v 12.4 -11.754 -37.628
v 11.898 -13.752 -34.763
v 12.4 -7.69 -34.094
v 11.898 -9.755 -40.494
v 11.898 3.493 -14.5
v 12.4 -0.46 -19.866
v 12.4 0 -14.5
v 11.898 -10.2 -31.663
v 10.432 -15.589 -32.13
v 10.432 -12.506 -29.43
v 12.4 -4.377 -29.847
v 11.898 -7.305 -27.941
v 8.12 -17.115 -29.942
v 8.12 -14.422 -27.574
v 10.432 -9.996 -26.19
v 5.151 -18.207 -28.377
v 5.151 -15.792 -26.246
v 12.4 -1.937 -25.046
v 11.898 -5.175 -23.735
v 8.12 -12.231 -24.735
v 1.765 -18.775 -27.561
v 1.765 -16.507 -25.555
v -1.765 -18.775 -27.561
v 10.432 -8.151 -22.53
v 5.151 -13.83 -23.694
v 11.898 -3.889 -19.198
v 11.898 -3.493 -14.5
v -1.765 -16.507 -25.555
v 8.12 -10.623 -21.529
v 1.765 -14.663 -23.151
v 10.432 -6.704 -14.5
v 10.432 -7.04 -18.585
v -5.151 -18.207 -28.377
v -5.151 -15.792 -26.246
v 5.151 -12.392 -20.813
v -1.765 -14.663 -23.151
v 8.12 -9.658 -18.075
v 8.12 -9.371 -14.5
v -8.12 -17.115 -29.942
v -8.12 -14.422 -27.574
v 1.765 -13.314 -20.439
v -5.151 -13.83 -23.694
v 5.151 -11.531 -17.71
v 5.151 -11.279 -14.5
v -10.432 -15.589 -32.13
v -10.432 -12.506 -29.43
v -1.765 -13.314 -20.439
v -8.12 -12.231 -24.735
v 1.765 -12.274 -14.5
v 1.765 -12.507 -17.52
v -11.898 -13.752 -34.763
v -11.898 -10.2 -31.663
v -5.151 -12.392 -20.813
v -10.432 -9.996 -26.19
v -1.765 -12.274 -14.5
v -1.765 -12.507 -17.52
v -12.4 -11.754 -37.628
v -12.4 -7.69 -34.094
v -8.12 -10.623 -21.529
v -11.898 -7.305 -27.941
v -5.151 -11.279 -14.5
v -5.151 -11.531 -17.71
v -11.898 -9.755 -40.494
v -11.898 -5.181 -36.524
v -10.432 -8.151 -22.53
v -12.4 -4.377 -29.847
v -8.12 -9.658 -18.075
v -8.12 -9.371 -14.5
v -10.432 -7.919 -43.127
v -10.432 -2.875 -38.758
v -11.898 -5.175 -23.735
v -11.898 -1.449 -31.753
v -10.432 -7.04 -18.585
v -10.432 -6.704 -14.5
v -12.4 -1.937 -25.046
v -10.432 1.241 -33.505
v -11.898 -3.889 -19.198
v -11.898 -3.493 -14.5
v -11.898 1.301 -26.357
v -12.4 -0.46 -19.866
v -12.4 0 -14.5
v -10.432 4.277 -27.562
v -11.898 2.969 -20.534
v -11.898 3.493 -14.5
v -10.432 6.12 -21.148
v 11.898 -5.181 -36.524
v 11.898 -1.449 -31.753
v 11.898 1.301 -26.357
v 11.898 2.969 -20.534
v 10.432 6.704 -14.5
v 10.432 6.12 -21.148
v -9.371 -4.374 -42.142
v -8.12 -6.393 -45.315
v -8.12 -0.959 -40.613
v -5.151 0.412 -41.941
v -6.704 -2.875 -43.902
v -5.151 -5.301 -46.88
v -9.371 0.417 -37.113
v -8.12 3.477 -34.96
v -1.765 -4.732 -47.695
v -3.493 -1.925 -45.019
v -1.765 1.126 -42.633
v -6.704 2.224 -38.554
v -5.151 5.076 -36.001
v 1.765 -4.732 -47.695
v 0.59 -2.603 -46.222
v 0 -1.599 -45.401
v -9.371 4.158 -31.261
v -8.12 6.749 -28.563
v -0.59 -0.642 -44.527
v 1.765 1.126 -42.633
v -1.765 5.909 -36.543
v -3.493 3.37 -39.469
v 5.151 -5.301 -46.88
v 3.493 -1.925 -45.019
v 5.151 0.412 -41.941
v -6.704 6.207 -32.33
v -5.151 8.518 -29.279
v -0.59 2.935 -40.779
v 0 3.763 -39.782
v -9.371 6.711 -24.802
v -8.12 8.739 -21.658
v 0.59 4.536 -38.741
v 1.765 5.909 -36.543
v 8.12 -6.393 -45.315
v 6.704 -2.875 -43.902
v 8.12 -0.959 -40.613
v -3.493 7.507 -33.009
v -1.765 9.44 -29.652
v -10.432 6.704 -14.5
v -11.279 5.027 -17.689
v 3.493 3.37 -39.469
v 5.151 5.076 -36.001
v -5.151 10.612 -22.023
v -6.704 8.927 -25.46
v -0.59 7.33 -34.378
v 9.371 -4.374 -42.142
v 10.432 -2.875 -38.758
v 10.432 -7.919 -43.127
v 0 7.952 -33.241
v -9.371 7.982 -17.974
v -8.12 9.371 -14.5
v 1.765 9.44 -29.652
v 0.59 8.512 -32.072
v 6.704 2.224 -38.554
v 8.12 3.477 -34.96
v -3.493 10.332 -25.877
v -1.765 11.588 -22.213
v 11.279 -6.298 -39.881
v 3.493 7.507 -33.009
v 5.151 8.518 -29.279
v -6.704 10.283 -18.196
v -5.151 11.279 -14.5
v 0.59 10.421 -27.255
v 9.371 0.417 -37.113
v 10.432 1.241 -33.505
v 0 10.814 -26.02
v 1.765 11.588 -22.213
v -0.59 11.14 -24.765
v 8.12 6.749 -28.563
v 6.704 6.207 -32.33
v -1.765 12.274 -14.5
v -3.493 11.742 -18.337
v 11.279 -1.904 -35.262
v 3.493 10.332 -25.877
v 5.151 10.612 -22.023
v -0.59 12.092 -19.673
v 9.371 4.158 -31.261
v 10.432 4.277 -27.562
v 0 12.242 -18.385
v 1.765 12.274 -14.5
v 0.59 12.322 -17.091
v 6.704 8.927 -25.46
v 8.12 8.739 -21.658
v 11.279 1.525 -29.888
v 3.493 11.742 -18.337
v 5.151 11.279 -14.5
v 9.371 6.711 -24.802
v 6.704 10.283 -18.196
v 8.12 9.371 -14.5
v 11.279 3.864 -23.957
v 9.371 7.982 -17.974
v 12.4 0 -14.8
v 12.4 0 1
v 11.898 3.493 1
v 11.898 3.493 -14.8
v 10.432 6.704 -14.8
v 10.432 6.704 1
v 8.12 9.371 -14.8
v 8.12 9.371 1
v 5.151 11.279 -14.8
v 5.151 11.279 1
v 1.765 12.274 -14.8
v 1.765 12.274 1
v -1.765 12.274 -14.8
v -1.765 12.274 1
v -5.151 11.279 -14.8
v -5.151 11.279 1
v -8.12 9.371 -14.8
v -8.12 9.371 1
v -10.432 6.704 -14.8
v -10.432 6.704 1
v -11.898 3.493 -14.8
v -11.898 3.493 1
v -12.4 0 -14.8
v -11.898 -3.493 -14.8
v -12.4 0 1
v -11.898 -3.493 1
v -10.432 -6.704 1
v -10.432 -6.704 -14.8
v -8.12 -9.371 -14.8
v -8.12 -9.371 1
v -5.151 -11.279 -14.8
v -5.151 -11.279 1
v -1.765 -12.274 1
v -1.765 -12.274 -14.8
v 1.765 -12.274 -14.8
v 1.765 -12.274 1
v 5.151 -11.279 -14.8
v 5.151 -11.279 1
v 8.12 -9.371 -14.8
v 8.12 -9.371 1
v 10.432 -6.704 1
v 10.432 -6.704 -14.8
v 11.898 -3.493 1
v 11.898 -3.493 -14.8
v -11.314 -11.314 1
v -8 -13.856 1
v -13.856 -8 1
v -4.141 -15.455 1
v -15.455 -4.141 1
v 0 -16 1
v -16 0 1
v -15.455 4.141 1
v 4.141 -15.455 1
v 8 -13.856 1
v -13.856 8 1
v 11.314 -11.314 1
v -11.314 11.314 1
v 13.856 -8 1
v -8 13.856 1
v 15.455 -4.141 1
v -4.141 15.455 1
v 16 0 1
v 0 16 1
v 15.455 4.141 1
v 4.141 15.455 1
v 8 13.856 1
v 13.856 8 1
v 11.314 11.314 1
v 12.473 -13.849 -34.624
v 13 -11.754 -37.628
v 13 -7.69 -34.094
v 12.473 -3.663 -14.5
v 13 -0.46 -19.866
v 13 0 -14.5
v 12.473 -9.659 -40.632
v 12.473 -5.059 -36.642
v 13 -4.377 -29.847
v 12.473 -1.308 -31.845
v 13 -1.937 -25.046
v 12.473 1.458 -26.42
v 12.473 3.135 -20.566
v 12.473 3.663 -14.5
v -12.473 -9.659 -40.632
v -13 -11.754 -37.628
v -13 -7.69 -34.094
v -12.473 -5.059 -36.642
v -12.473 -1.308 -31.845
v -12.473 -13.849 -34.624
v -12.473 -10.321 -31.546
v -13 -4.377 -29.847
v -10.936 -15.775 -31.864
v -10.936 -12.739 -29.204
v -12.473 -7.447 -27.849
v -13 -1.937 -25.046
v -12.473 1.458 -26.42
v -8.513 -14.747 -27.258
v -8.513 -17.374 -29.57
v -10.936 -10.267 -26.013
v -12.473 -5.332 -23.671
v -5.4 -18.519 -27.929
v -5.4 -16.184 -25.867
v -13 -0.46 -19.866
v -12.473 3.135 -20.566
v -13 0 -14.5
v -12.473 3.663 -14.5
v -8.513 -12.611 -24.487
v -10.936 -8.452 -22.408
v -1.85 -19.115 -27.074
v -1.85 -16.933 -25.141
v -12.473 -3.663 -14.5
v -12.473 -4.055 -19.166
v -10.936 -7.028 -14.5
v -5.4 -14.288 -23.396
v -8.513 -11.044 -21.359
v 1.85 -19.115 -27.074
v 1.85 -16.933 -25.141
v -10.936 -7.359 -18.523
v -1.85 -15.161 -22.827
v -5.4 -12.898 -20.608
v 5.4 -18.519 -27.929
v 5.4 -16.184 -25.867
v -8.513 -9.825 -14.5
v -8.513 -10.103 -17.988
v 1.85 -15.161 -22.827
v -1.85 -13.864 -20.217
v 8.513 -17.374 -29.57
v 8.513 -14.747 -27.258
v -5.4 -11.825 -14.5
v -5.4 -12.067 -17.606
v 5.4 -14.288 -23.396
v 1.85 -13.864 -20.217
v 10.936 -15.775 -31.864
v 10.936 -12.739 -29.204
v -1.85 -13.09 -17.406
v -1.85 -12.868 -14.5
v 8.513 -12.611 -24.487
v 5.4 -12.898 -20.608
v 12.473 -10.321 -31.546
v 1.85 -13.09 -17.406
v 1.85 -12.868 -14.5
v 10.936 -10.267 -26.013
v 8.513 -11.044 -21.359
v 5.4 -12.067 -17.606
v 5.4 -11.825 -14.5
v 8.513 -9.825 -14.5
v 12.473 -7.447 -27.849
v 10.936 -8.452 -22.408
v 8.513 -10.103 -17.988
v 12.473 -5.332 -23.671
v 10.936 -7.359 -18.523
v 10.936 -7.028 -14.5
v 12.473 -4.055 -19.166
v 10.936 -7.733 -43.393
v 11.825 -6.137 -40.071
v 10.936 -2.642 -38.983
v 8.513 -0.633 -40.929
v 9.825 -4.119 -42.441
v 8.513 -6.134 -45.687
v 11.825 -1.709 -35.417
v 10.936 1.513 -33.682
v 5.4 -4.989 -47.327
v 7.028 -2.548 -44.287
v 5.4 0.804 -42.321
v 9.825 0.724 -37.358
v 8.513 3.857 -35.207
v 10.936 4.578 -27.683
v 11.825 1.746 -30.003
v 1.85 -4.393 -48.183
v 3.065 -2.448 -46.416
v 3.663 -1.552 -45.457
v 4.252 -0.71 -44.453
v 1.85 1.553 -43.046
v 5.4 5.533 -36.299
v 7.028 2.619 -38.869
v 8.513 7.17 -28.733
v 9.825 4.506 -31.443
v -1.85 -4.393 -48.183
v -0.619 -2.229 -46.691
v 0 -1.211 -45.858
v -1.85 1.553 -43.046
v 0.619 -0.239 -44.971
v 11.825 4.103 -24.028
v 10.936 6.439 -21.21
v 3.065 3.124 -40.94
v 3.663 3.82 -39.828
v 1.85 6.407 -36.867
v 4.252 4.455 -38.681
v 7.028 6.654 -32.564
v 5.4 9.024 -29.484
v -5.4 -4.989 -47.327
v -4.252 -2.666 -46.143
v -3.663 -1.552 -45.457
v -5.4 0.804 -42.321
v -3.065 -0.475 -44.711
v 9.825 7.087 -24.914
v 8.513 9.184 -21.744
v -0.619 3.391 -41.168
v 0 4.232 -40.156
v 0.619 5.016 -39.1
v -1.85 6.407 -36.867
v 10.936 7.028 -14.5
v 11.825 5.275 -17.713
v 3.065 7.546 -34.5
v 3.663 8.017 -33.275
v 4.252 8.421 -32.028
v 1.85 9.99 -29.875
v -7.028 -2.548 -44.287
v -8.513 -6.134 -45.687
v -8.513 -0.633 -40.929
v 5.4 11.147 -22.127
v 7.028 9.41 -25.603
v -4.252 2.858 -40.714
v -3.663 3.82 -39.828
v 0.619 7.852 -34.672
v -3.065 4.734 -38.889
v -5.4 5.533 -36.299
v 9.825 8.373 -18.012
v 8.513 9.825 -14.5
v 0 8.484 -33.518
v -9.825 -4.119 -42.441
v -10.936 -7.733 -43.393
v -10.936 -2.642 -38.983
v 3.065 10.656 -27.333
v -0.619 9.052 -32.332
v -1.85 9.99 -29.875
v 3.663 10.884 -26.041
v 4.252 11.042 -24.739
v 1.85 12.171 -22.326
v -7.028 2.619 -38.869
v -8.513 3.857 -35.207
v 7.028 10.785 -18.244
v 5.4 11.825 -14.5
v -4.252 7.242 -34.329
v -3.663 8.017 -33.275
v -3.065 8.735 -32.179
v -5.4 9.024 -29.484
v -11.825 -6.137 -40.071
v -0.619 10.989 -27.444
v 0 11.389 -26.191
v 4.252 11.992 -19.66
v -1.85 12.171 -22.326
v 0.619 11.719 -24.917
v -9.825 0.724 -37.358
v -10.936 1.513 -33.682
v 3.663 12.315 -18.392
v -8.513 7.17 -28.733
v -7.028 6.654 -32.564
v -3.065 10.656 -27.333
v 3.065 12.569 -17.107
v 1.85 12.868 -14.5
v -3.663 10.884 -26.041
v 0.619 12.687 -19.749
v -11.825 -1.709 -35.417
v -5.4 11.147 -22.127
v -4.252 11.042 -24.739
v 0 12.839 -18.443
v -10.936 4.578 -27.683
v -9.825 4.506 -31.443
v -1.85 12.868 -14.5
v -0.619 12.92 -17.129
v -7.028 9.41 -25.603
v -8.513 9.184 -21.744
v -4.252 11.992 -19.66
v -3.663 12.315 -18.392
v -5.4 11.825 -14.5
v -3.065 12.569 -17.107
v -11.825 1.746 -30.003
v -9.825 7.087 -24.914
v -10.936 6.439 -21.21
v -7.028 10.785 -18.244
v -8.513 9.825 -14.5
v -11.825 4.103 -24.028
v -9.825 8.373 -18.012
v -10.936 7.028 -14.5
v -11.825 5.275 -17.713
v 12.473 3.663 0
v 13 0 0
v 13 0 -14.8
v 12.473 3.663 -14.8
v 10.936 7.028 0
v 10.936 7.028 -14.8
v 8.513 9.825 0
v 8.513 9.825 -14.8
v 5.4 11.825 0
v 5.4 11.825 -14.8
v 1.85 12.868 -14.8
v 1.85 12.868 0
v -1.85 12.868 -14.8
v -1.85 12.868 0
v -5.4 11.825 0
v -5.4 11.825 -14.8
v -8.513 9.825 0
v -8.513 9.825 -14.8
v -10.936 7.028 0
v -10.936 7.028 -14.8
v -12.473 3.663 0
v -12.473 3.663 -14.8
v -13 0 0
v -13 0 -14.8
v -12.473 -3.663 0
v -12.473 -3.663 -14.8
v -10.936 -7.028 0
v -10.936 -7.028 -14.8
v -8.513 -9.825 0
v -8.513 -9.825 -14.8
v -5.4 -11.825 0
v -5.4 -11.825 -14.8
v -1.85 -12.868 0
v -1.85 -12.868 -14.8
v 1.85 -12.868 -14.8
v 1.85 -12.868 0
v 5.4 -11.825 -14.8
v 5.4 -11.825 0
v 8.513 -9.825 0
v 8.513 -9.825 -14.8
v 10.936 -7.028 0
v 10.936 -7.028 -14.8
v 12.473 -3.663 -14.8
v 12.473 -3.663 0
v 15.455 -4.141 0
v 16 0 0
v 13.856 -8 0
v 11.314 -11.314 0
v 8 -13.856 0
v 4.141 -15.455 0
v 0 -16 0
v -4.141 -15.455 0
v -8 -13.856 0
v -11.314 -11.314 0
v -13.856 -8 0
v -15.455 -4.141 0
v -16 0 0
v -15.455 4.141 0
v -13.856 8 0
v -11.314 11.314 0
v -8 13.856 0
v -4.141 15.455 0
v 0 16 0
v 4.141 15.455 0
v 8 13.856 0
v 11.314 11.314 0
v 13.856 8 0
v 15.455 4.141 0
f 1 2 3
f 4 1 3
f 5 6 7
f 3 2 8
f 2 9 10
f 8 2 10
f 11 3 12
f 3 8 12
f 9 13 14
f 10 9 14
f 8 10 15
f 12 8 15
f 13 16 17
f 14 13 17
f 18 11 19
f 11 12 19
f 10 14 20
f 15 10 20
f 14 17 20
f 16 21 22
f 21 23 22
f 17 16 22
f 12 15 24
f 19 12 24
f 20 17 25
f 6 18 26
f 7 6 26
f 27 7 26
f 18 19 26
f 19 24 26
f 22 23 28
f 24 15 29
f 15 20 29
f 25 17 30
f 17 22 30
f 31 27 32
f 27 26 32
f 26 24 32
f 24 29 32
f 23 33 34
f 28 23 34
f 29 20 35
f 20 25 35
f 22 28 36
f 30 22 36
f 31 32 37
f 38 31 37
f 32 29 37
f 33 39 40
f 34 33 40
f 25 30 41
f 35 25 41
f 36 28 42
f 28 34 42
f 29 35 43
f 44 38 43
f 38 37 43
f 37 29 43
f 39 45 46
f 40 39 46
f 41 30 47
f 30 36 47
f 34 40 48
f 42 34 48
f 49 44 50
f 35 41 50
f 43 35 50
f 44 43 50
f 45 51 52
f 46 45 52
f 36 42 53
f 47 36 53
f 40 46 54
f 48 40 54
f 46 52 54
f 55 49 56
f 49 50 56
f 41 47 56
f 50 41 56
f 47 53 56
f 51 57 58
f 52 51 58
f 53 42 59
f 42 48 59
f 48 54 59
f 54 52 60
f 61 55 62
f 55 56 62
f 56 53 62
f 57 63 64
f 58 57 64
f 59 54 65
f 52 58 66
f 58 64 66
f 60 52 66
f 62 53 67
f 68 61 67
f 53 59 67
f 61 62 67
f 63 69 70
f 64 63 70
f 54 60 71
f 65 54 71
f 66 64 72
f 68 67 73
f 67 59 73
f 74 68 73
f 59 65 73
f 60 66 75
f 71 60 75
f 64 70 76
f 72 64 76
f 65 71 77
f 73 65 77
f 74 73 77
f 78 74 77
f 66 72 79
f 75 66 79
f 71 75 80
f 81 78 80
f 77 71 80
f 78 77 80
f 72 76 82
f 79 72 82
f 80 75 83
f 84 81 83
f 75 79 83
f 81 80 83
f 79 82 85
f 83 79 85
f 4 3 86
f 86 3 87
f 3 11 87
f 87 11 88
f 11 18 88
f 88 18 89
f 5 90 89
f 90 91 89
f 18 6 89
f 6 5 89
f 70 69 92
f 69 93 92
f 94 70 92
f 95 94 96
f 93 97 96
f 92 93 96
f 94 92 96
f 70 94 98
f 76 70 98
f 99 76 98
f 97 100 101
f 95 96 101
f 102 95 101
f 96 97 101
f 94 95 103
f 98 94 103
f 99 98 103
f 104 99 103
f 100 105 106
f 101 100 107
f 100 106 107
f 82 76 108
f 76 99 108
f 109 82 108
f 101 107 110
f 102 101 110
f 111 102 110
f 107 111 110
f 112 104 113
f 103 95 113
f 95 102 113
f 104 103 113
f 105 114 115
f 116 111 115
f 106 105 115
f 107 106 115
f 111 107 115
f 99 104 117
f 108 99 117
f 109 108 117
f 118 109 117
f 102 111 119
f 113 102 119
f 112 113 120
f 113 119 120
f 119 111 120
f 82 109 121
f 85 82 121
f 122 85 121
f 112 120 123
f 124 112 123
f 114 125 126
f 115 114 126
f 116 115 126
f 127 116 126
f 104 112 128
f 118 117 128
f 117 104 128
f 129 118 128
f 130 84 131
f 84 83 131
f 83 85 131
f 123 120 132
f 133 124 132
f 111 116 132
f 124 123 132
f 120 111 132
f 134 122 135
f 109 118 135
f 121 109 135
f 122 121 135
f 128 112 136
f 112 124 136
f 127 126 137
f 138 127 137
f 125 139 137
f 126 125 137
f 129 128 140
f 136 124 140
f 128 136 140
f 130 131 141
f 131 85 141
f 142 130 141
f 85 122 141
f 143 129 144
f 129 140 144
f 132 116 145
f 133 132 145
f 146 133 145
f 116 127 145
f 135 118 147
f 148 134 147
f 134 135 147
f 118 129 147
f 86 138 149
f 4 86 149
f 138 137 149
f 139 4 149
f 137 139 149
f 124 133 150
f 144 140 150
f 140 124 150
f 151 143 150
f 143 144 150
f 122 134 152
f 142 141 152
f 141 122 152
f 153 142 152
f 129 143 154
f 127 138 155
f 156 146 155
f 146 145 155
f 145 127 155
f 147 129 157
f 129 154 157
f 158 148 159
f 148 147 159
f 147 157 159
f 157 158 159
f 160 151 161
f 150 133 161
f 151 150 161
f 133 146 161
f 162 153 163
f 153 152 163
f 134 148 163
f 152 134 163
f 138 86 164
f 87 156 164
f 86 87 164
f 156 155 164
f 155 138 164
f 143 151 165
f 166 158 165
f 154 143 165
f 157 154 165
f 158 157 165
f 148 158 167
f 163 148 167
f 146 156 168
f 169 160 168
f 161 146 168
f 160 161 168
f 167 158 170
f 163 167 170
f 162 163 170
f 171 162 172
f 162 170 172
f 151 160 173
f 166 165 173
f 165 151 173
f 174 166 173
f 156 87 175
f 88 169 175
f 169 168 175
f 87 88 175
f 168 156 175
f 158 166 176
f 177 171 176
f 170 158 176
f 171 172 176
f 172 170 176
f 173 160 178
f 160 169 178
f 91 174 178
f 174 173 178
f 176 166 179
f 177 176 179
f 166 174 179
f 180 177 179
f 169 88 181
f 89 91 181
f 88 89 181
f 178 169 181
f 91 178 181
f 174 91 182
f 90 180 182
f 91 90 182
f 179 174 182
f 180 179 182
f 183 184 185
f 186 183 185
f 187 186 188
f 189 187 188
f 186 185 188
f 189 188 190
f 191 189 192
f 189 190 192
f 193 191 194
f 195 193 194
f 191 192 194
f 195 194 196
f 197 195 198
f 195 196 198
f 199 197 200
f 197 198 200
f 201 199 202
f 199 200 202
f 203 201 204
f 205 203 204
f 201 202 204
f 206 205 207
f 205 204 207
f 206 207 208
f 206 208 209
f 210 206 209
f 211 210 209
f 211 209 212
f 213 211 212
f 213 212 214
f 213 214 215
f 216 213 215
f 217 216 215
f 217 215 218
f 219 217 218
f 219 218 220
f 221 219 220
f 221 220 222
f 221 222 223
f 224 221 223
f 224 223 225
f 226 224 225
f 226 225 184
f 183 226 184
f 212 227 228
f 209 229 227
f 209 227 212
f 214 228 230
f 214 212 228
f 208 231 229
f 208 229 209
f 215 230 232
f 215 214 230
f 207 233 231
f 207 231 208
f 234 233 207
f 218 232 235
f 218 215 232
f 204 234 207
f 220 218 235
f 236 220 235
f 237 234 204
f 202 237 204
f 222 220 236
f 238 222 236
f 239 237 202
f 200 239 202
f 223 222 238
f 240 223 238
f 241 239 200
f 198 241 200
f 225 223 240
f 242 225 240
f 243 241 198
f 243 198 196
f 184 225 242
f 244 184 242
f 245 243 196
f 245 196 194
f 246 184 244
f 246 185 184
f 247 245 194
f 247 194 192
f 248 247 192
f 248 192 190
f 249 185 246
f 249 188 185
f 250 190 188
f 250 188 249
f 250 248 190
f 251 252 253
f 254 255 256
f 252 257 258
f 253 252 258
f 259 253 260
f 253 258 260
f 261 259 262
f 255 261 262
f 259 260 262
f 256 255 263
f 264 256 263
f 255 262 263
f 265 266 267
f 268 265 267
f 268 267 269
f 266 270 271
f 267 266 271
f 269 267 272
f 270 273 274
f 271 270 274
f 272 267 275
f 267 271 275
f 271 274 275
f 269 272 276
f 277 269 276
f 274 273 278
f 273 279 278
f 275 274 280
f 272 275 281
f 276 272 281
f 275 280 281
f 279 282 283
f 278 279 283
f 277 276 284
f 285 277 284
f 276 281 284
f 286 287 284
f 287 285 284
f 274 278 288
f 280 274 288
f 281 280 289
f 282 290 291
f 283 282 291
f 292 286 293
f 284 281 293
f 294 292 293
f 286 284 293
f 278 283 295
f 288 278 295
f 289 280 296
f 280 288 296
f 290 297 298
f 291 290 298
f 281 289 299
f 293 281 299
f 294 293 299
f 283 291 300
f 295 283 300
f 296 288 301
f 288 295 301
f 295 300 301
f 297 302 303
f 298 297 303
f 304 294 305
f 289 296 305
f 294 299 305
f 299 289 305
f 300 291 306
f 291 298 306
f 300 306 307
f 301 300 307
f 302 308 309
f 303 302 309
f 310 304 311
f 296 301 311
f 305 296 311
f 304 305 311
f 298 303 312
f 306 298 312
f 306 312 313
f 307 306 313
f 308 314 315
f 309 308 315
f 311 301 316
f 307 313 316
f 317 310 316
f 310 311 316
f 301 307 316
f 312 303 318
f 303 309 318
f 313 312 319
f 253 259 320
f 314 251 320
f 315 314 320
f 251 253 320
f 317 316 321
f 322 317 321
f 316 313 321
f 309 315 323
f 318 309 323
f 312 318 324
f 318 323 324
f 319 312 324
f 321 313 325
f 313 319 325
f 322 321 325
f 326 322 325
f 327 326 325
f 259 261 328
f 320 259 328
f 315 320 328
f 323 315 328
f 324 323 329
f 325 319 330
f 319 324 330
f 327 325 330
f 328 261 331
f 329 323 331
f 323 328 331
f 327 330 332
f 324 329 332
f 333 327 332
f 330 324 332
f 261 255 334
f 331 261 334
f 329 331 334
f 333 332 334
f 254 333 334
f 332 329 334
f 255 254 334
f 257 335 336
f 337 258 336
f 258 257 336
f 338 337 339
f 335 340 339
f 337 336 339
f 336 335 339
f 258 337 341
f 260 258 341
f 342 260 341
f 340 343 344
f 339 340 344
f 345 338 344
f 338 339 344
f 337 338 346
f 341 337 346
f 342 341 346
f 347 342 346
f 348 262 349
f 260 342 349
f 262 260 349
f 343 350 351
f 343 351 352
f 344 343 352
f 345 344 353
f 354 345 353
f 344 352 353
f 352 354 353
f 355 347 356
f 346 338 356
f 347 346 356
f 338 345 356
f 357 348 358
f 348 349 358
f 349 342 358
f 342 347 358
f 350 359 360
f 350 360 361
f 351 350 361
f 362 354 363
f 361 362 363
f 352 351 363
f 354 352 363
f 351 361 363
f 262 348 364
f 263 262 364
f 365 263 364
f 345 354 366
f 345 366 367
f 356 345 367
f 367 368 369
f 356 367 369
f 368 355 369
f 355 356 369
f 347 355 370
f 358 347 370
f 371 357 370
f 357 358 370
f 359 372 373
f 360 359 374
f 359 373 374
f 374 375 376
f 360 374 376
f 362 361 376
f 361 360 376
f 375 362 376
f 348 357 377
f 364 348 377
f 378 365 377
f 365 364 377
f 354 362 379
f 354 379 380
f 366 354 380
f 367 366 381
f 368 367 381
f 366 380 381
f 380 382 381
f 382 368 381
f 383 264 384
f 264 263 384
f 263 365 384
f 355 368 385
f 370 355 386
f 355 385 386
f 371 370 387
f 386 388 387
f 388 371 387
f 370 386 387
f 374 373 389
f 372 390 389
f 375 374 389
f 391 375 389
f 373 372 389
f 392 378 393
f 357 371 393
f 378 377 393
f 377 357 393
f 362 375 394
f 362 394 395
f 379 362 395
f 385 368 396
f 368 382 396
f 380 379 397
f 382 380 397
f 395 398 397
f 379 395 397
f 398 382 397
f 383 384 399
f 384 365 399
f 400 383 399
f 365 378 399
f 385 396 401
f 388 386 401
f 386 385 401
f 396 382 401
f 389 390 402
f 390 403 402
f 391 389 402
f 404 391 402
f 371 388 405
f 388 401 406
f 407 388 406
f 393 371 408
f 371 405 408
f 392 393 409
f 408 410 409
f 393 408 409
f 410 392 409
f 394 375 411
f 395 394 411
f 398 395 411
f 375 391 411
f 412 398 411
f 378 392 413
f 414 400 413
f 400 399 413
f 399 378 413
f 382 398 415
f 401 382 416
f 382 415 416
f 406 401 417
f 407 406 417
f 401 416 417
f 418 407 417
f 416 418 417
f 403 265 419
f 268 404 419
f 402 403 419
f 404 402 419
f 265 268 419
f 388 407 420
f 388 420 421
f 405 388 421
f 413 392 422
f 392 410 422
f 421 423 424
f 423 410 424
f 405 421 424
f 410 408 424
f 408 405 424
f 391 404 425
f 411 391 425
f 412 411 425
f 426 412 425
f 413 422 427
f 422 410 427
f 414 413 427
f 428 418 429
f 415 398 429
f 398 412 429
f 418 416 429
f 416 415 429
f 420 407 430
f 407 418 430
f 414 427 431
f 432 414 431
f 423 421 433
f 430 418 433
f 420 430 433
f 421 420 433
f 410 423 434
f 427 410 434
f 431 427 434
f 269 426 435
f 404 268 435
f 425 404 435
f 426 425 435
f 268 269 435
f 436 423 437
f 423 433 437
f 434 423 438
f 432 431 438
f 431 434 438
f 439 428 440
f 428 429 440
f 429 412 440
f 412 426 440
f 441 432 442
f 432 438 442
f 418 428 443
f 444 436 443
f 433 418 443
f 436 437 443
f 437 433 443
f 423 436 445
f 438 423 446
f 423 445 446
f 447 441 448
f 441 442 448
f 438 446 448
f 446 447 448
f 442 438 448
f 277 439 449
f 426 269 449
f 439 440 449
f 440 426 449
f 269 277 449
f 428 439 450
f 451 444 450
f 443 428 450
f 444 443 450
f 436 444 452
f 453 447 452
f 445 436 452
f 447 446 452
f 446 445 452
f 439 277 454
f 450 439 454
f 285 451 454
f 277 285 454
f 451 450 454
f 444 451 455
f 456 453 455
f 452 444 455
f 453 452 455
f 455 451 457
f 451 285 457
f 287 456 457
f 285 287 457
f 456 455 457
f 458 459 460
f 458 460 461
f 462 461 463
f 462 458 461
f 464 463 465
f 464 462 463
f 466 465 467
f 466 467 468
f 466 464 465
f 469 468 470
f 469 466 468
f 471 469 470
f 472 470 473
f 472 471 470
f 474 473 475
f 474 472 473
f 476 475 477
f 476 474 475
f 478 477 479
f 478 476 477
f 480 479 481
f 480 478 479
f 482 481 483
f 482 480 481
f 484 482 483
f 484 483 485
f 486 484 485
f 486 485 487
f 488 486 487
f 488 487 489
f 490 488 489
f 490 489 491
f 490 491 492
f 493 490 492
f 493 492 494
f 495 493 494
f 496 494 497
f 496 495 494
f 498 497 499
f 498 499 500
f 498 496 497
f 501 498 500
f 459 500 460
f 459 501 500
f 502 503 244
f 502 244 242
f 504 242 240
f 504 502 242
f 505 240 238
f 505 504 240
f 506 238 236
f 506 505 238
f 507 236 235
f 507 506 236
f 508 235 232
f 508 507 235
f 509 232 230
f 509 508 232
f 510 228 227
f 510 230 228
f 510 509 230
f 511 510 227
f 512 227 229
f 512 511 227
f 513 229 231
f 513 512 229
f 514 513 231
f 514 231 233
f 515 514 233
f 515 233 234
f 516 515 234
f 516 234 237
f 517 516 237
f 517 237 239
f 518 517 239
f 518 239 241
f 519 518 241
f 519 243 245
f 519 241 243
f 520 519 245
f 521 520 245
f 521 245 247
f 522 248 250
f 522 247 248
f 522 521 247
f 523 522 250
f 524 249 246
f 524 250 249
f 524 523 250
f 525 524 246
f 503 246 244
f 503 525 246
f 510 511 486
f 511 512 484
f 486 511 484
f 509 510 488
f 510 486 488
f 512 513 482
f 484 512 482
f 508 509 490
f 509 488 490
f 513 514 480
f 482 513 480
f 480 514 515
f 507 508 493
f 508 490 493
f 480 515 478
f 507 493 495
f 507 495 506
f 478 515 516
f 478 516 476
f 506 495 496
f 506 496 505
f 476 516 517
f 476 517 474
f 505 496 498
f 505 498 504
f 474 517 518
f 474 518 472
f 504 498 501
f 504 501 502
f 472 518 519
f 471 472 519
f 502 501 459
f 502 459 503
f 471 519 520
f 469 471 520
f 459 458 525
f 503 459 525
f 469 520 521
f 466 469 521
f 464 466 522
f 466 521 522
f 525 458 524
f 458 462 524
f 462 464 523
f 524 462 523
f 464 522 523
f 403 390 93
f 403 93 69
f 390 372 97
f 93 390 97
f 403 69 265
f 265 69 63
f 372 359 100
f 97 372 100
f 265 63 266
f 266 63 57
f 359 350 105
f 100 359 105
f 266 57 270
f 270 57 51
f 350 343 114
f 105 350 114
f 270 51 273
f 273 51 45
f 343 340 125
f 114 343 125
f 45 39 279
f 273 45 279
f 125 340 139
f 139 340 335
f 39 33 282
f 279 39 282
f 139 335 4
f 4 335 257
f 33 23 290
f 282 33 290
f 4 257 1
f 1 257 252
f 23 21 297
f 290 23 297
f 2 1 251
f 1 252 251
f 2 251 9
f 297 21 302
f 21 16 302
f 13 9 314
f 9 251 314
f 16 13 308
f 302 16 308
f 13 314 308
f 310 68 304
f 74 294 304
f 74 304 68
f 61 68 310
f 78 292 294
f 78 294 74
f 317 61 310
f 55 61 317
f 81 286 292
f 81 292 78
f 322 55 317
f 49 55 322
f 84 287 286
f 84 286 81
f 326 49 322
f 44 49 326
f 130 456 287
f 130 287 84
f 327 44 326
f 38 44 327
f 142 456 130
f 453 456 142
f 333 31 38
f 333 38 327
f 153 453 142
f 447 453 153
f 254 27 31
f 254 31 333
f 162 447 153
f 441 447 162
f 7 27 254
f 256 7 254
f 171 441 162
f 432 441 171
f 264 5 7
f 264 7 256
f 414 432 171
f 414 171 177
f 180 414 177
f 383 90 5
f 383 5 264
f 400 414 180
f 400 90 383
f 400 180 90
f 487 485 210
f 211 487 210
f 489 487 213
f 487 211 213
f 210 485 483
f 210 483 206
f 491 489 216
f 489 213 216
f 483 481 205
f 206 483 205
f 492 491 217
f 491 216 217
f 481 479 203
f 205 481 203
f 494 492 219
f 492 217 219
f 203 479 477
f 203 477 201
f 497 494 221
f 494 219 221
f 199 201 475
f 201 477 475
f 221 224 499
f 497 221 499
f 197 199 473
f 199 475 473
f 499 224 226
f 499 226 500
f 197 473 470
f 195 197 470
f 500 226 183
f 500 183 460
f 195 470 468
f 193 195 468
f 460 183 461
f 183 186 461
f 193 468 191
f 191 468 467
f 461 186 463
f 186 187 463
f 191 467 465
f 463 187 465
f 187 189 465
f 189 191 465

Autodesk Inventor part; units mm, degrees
ref_plane "YZ Plane" through (0, 0, 0) normal (1, 0, 0) x (0, 1, 0)
ref_plane "XZ Plane" through (0, 0, 0) normal (0, 1, 0) x (-1, 0, 0)
ref_plane "XY Plane" through (0, 0, 0) normal (0, 0, 1) x (1, 0, 0)
sketch "Esquisse2" plane through (0, 0, 0) normal (0, 0, 1) x (1, 0, 0)
  circle A0 centre (0, 0) radius 16
  circle A1 centre (0, 0) radius 13
  dimension "d0" = 32
  dimension "d1" = 26
extrude "Extrusion1" add sketch "Esquisse2" along normal blind 1
sketch "Esquisse3" plane through (0, 0, 1) normal (0, 0, 1) x (1, 0, 0)
  circle A0 centre (0, 0) radius 12.4
  circle A1 centre (0, 0) radius 13
  dimension "d6" = 26
  dimension "d7" = 24.8
extrude "Extrusion2" add sketch "Esquisse3" against normal blind 15.8
sketch "Esquisse4" plane through (0, 0, 0) normal (1, 0, 0) x (0, 1, 0)
  line L0 (12.4, -14.8) -> (-12.4, -14.8) construction
  line L1 (-12.4, 1) -> (12.4, 1) construction
  arc A0 (-12, -37.8) -> (0, -14.8) centre (-28.0417, -14.8) ccw
  line L2 (0, -67.4158) -> (0, 12.4026) construction
  line L3 (0, -14.8) -> (0, -44.8) construction
  line L4 (22.3657, -42.8417) -> (-48.6343, -42.8417) construction
  point P0 (0, 0)
  dimension "d9" = 30
  dimension "d10" = 23
  dimension "d17" = 12
ref_plane "Plan de construction1" through (0, 0, -14.5) normal (0, 0, 1) x (1, 0, 0)
sketch "Esquisse6" plane through (0, 0, -14.5) normal (0, 0, 1) x (1, 0, 0)
  circle A0 centre (0, 0) radius 12.4 construction
  circle A1 centre (0, 0) radius 16 construction
  circle A2 centre (0, 0) radius 13 construction
  circle A3 centre (0, 0) radius 12.4
  circle A4 centre (0, 0) radius 13
  dimension "d16" = 24.8
sweep "Balayage1" add profiles "Esquisse6" path "Esquisse4" separate body
properties part number "P013_Canon_venturiCoudé"
